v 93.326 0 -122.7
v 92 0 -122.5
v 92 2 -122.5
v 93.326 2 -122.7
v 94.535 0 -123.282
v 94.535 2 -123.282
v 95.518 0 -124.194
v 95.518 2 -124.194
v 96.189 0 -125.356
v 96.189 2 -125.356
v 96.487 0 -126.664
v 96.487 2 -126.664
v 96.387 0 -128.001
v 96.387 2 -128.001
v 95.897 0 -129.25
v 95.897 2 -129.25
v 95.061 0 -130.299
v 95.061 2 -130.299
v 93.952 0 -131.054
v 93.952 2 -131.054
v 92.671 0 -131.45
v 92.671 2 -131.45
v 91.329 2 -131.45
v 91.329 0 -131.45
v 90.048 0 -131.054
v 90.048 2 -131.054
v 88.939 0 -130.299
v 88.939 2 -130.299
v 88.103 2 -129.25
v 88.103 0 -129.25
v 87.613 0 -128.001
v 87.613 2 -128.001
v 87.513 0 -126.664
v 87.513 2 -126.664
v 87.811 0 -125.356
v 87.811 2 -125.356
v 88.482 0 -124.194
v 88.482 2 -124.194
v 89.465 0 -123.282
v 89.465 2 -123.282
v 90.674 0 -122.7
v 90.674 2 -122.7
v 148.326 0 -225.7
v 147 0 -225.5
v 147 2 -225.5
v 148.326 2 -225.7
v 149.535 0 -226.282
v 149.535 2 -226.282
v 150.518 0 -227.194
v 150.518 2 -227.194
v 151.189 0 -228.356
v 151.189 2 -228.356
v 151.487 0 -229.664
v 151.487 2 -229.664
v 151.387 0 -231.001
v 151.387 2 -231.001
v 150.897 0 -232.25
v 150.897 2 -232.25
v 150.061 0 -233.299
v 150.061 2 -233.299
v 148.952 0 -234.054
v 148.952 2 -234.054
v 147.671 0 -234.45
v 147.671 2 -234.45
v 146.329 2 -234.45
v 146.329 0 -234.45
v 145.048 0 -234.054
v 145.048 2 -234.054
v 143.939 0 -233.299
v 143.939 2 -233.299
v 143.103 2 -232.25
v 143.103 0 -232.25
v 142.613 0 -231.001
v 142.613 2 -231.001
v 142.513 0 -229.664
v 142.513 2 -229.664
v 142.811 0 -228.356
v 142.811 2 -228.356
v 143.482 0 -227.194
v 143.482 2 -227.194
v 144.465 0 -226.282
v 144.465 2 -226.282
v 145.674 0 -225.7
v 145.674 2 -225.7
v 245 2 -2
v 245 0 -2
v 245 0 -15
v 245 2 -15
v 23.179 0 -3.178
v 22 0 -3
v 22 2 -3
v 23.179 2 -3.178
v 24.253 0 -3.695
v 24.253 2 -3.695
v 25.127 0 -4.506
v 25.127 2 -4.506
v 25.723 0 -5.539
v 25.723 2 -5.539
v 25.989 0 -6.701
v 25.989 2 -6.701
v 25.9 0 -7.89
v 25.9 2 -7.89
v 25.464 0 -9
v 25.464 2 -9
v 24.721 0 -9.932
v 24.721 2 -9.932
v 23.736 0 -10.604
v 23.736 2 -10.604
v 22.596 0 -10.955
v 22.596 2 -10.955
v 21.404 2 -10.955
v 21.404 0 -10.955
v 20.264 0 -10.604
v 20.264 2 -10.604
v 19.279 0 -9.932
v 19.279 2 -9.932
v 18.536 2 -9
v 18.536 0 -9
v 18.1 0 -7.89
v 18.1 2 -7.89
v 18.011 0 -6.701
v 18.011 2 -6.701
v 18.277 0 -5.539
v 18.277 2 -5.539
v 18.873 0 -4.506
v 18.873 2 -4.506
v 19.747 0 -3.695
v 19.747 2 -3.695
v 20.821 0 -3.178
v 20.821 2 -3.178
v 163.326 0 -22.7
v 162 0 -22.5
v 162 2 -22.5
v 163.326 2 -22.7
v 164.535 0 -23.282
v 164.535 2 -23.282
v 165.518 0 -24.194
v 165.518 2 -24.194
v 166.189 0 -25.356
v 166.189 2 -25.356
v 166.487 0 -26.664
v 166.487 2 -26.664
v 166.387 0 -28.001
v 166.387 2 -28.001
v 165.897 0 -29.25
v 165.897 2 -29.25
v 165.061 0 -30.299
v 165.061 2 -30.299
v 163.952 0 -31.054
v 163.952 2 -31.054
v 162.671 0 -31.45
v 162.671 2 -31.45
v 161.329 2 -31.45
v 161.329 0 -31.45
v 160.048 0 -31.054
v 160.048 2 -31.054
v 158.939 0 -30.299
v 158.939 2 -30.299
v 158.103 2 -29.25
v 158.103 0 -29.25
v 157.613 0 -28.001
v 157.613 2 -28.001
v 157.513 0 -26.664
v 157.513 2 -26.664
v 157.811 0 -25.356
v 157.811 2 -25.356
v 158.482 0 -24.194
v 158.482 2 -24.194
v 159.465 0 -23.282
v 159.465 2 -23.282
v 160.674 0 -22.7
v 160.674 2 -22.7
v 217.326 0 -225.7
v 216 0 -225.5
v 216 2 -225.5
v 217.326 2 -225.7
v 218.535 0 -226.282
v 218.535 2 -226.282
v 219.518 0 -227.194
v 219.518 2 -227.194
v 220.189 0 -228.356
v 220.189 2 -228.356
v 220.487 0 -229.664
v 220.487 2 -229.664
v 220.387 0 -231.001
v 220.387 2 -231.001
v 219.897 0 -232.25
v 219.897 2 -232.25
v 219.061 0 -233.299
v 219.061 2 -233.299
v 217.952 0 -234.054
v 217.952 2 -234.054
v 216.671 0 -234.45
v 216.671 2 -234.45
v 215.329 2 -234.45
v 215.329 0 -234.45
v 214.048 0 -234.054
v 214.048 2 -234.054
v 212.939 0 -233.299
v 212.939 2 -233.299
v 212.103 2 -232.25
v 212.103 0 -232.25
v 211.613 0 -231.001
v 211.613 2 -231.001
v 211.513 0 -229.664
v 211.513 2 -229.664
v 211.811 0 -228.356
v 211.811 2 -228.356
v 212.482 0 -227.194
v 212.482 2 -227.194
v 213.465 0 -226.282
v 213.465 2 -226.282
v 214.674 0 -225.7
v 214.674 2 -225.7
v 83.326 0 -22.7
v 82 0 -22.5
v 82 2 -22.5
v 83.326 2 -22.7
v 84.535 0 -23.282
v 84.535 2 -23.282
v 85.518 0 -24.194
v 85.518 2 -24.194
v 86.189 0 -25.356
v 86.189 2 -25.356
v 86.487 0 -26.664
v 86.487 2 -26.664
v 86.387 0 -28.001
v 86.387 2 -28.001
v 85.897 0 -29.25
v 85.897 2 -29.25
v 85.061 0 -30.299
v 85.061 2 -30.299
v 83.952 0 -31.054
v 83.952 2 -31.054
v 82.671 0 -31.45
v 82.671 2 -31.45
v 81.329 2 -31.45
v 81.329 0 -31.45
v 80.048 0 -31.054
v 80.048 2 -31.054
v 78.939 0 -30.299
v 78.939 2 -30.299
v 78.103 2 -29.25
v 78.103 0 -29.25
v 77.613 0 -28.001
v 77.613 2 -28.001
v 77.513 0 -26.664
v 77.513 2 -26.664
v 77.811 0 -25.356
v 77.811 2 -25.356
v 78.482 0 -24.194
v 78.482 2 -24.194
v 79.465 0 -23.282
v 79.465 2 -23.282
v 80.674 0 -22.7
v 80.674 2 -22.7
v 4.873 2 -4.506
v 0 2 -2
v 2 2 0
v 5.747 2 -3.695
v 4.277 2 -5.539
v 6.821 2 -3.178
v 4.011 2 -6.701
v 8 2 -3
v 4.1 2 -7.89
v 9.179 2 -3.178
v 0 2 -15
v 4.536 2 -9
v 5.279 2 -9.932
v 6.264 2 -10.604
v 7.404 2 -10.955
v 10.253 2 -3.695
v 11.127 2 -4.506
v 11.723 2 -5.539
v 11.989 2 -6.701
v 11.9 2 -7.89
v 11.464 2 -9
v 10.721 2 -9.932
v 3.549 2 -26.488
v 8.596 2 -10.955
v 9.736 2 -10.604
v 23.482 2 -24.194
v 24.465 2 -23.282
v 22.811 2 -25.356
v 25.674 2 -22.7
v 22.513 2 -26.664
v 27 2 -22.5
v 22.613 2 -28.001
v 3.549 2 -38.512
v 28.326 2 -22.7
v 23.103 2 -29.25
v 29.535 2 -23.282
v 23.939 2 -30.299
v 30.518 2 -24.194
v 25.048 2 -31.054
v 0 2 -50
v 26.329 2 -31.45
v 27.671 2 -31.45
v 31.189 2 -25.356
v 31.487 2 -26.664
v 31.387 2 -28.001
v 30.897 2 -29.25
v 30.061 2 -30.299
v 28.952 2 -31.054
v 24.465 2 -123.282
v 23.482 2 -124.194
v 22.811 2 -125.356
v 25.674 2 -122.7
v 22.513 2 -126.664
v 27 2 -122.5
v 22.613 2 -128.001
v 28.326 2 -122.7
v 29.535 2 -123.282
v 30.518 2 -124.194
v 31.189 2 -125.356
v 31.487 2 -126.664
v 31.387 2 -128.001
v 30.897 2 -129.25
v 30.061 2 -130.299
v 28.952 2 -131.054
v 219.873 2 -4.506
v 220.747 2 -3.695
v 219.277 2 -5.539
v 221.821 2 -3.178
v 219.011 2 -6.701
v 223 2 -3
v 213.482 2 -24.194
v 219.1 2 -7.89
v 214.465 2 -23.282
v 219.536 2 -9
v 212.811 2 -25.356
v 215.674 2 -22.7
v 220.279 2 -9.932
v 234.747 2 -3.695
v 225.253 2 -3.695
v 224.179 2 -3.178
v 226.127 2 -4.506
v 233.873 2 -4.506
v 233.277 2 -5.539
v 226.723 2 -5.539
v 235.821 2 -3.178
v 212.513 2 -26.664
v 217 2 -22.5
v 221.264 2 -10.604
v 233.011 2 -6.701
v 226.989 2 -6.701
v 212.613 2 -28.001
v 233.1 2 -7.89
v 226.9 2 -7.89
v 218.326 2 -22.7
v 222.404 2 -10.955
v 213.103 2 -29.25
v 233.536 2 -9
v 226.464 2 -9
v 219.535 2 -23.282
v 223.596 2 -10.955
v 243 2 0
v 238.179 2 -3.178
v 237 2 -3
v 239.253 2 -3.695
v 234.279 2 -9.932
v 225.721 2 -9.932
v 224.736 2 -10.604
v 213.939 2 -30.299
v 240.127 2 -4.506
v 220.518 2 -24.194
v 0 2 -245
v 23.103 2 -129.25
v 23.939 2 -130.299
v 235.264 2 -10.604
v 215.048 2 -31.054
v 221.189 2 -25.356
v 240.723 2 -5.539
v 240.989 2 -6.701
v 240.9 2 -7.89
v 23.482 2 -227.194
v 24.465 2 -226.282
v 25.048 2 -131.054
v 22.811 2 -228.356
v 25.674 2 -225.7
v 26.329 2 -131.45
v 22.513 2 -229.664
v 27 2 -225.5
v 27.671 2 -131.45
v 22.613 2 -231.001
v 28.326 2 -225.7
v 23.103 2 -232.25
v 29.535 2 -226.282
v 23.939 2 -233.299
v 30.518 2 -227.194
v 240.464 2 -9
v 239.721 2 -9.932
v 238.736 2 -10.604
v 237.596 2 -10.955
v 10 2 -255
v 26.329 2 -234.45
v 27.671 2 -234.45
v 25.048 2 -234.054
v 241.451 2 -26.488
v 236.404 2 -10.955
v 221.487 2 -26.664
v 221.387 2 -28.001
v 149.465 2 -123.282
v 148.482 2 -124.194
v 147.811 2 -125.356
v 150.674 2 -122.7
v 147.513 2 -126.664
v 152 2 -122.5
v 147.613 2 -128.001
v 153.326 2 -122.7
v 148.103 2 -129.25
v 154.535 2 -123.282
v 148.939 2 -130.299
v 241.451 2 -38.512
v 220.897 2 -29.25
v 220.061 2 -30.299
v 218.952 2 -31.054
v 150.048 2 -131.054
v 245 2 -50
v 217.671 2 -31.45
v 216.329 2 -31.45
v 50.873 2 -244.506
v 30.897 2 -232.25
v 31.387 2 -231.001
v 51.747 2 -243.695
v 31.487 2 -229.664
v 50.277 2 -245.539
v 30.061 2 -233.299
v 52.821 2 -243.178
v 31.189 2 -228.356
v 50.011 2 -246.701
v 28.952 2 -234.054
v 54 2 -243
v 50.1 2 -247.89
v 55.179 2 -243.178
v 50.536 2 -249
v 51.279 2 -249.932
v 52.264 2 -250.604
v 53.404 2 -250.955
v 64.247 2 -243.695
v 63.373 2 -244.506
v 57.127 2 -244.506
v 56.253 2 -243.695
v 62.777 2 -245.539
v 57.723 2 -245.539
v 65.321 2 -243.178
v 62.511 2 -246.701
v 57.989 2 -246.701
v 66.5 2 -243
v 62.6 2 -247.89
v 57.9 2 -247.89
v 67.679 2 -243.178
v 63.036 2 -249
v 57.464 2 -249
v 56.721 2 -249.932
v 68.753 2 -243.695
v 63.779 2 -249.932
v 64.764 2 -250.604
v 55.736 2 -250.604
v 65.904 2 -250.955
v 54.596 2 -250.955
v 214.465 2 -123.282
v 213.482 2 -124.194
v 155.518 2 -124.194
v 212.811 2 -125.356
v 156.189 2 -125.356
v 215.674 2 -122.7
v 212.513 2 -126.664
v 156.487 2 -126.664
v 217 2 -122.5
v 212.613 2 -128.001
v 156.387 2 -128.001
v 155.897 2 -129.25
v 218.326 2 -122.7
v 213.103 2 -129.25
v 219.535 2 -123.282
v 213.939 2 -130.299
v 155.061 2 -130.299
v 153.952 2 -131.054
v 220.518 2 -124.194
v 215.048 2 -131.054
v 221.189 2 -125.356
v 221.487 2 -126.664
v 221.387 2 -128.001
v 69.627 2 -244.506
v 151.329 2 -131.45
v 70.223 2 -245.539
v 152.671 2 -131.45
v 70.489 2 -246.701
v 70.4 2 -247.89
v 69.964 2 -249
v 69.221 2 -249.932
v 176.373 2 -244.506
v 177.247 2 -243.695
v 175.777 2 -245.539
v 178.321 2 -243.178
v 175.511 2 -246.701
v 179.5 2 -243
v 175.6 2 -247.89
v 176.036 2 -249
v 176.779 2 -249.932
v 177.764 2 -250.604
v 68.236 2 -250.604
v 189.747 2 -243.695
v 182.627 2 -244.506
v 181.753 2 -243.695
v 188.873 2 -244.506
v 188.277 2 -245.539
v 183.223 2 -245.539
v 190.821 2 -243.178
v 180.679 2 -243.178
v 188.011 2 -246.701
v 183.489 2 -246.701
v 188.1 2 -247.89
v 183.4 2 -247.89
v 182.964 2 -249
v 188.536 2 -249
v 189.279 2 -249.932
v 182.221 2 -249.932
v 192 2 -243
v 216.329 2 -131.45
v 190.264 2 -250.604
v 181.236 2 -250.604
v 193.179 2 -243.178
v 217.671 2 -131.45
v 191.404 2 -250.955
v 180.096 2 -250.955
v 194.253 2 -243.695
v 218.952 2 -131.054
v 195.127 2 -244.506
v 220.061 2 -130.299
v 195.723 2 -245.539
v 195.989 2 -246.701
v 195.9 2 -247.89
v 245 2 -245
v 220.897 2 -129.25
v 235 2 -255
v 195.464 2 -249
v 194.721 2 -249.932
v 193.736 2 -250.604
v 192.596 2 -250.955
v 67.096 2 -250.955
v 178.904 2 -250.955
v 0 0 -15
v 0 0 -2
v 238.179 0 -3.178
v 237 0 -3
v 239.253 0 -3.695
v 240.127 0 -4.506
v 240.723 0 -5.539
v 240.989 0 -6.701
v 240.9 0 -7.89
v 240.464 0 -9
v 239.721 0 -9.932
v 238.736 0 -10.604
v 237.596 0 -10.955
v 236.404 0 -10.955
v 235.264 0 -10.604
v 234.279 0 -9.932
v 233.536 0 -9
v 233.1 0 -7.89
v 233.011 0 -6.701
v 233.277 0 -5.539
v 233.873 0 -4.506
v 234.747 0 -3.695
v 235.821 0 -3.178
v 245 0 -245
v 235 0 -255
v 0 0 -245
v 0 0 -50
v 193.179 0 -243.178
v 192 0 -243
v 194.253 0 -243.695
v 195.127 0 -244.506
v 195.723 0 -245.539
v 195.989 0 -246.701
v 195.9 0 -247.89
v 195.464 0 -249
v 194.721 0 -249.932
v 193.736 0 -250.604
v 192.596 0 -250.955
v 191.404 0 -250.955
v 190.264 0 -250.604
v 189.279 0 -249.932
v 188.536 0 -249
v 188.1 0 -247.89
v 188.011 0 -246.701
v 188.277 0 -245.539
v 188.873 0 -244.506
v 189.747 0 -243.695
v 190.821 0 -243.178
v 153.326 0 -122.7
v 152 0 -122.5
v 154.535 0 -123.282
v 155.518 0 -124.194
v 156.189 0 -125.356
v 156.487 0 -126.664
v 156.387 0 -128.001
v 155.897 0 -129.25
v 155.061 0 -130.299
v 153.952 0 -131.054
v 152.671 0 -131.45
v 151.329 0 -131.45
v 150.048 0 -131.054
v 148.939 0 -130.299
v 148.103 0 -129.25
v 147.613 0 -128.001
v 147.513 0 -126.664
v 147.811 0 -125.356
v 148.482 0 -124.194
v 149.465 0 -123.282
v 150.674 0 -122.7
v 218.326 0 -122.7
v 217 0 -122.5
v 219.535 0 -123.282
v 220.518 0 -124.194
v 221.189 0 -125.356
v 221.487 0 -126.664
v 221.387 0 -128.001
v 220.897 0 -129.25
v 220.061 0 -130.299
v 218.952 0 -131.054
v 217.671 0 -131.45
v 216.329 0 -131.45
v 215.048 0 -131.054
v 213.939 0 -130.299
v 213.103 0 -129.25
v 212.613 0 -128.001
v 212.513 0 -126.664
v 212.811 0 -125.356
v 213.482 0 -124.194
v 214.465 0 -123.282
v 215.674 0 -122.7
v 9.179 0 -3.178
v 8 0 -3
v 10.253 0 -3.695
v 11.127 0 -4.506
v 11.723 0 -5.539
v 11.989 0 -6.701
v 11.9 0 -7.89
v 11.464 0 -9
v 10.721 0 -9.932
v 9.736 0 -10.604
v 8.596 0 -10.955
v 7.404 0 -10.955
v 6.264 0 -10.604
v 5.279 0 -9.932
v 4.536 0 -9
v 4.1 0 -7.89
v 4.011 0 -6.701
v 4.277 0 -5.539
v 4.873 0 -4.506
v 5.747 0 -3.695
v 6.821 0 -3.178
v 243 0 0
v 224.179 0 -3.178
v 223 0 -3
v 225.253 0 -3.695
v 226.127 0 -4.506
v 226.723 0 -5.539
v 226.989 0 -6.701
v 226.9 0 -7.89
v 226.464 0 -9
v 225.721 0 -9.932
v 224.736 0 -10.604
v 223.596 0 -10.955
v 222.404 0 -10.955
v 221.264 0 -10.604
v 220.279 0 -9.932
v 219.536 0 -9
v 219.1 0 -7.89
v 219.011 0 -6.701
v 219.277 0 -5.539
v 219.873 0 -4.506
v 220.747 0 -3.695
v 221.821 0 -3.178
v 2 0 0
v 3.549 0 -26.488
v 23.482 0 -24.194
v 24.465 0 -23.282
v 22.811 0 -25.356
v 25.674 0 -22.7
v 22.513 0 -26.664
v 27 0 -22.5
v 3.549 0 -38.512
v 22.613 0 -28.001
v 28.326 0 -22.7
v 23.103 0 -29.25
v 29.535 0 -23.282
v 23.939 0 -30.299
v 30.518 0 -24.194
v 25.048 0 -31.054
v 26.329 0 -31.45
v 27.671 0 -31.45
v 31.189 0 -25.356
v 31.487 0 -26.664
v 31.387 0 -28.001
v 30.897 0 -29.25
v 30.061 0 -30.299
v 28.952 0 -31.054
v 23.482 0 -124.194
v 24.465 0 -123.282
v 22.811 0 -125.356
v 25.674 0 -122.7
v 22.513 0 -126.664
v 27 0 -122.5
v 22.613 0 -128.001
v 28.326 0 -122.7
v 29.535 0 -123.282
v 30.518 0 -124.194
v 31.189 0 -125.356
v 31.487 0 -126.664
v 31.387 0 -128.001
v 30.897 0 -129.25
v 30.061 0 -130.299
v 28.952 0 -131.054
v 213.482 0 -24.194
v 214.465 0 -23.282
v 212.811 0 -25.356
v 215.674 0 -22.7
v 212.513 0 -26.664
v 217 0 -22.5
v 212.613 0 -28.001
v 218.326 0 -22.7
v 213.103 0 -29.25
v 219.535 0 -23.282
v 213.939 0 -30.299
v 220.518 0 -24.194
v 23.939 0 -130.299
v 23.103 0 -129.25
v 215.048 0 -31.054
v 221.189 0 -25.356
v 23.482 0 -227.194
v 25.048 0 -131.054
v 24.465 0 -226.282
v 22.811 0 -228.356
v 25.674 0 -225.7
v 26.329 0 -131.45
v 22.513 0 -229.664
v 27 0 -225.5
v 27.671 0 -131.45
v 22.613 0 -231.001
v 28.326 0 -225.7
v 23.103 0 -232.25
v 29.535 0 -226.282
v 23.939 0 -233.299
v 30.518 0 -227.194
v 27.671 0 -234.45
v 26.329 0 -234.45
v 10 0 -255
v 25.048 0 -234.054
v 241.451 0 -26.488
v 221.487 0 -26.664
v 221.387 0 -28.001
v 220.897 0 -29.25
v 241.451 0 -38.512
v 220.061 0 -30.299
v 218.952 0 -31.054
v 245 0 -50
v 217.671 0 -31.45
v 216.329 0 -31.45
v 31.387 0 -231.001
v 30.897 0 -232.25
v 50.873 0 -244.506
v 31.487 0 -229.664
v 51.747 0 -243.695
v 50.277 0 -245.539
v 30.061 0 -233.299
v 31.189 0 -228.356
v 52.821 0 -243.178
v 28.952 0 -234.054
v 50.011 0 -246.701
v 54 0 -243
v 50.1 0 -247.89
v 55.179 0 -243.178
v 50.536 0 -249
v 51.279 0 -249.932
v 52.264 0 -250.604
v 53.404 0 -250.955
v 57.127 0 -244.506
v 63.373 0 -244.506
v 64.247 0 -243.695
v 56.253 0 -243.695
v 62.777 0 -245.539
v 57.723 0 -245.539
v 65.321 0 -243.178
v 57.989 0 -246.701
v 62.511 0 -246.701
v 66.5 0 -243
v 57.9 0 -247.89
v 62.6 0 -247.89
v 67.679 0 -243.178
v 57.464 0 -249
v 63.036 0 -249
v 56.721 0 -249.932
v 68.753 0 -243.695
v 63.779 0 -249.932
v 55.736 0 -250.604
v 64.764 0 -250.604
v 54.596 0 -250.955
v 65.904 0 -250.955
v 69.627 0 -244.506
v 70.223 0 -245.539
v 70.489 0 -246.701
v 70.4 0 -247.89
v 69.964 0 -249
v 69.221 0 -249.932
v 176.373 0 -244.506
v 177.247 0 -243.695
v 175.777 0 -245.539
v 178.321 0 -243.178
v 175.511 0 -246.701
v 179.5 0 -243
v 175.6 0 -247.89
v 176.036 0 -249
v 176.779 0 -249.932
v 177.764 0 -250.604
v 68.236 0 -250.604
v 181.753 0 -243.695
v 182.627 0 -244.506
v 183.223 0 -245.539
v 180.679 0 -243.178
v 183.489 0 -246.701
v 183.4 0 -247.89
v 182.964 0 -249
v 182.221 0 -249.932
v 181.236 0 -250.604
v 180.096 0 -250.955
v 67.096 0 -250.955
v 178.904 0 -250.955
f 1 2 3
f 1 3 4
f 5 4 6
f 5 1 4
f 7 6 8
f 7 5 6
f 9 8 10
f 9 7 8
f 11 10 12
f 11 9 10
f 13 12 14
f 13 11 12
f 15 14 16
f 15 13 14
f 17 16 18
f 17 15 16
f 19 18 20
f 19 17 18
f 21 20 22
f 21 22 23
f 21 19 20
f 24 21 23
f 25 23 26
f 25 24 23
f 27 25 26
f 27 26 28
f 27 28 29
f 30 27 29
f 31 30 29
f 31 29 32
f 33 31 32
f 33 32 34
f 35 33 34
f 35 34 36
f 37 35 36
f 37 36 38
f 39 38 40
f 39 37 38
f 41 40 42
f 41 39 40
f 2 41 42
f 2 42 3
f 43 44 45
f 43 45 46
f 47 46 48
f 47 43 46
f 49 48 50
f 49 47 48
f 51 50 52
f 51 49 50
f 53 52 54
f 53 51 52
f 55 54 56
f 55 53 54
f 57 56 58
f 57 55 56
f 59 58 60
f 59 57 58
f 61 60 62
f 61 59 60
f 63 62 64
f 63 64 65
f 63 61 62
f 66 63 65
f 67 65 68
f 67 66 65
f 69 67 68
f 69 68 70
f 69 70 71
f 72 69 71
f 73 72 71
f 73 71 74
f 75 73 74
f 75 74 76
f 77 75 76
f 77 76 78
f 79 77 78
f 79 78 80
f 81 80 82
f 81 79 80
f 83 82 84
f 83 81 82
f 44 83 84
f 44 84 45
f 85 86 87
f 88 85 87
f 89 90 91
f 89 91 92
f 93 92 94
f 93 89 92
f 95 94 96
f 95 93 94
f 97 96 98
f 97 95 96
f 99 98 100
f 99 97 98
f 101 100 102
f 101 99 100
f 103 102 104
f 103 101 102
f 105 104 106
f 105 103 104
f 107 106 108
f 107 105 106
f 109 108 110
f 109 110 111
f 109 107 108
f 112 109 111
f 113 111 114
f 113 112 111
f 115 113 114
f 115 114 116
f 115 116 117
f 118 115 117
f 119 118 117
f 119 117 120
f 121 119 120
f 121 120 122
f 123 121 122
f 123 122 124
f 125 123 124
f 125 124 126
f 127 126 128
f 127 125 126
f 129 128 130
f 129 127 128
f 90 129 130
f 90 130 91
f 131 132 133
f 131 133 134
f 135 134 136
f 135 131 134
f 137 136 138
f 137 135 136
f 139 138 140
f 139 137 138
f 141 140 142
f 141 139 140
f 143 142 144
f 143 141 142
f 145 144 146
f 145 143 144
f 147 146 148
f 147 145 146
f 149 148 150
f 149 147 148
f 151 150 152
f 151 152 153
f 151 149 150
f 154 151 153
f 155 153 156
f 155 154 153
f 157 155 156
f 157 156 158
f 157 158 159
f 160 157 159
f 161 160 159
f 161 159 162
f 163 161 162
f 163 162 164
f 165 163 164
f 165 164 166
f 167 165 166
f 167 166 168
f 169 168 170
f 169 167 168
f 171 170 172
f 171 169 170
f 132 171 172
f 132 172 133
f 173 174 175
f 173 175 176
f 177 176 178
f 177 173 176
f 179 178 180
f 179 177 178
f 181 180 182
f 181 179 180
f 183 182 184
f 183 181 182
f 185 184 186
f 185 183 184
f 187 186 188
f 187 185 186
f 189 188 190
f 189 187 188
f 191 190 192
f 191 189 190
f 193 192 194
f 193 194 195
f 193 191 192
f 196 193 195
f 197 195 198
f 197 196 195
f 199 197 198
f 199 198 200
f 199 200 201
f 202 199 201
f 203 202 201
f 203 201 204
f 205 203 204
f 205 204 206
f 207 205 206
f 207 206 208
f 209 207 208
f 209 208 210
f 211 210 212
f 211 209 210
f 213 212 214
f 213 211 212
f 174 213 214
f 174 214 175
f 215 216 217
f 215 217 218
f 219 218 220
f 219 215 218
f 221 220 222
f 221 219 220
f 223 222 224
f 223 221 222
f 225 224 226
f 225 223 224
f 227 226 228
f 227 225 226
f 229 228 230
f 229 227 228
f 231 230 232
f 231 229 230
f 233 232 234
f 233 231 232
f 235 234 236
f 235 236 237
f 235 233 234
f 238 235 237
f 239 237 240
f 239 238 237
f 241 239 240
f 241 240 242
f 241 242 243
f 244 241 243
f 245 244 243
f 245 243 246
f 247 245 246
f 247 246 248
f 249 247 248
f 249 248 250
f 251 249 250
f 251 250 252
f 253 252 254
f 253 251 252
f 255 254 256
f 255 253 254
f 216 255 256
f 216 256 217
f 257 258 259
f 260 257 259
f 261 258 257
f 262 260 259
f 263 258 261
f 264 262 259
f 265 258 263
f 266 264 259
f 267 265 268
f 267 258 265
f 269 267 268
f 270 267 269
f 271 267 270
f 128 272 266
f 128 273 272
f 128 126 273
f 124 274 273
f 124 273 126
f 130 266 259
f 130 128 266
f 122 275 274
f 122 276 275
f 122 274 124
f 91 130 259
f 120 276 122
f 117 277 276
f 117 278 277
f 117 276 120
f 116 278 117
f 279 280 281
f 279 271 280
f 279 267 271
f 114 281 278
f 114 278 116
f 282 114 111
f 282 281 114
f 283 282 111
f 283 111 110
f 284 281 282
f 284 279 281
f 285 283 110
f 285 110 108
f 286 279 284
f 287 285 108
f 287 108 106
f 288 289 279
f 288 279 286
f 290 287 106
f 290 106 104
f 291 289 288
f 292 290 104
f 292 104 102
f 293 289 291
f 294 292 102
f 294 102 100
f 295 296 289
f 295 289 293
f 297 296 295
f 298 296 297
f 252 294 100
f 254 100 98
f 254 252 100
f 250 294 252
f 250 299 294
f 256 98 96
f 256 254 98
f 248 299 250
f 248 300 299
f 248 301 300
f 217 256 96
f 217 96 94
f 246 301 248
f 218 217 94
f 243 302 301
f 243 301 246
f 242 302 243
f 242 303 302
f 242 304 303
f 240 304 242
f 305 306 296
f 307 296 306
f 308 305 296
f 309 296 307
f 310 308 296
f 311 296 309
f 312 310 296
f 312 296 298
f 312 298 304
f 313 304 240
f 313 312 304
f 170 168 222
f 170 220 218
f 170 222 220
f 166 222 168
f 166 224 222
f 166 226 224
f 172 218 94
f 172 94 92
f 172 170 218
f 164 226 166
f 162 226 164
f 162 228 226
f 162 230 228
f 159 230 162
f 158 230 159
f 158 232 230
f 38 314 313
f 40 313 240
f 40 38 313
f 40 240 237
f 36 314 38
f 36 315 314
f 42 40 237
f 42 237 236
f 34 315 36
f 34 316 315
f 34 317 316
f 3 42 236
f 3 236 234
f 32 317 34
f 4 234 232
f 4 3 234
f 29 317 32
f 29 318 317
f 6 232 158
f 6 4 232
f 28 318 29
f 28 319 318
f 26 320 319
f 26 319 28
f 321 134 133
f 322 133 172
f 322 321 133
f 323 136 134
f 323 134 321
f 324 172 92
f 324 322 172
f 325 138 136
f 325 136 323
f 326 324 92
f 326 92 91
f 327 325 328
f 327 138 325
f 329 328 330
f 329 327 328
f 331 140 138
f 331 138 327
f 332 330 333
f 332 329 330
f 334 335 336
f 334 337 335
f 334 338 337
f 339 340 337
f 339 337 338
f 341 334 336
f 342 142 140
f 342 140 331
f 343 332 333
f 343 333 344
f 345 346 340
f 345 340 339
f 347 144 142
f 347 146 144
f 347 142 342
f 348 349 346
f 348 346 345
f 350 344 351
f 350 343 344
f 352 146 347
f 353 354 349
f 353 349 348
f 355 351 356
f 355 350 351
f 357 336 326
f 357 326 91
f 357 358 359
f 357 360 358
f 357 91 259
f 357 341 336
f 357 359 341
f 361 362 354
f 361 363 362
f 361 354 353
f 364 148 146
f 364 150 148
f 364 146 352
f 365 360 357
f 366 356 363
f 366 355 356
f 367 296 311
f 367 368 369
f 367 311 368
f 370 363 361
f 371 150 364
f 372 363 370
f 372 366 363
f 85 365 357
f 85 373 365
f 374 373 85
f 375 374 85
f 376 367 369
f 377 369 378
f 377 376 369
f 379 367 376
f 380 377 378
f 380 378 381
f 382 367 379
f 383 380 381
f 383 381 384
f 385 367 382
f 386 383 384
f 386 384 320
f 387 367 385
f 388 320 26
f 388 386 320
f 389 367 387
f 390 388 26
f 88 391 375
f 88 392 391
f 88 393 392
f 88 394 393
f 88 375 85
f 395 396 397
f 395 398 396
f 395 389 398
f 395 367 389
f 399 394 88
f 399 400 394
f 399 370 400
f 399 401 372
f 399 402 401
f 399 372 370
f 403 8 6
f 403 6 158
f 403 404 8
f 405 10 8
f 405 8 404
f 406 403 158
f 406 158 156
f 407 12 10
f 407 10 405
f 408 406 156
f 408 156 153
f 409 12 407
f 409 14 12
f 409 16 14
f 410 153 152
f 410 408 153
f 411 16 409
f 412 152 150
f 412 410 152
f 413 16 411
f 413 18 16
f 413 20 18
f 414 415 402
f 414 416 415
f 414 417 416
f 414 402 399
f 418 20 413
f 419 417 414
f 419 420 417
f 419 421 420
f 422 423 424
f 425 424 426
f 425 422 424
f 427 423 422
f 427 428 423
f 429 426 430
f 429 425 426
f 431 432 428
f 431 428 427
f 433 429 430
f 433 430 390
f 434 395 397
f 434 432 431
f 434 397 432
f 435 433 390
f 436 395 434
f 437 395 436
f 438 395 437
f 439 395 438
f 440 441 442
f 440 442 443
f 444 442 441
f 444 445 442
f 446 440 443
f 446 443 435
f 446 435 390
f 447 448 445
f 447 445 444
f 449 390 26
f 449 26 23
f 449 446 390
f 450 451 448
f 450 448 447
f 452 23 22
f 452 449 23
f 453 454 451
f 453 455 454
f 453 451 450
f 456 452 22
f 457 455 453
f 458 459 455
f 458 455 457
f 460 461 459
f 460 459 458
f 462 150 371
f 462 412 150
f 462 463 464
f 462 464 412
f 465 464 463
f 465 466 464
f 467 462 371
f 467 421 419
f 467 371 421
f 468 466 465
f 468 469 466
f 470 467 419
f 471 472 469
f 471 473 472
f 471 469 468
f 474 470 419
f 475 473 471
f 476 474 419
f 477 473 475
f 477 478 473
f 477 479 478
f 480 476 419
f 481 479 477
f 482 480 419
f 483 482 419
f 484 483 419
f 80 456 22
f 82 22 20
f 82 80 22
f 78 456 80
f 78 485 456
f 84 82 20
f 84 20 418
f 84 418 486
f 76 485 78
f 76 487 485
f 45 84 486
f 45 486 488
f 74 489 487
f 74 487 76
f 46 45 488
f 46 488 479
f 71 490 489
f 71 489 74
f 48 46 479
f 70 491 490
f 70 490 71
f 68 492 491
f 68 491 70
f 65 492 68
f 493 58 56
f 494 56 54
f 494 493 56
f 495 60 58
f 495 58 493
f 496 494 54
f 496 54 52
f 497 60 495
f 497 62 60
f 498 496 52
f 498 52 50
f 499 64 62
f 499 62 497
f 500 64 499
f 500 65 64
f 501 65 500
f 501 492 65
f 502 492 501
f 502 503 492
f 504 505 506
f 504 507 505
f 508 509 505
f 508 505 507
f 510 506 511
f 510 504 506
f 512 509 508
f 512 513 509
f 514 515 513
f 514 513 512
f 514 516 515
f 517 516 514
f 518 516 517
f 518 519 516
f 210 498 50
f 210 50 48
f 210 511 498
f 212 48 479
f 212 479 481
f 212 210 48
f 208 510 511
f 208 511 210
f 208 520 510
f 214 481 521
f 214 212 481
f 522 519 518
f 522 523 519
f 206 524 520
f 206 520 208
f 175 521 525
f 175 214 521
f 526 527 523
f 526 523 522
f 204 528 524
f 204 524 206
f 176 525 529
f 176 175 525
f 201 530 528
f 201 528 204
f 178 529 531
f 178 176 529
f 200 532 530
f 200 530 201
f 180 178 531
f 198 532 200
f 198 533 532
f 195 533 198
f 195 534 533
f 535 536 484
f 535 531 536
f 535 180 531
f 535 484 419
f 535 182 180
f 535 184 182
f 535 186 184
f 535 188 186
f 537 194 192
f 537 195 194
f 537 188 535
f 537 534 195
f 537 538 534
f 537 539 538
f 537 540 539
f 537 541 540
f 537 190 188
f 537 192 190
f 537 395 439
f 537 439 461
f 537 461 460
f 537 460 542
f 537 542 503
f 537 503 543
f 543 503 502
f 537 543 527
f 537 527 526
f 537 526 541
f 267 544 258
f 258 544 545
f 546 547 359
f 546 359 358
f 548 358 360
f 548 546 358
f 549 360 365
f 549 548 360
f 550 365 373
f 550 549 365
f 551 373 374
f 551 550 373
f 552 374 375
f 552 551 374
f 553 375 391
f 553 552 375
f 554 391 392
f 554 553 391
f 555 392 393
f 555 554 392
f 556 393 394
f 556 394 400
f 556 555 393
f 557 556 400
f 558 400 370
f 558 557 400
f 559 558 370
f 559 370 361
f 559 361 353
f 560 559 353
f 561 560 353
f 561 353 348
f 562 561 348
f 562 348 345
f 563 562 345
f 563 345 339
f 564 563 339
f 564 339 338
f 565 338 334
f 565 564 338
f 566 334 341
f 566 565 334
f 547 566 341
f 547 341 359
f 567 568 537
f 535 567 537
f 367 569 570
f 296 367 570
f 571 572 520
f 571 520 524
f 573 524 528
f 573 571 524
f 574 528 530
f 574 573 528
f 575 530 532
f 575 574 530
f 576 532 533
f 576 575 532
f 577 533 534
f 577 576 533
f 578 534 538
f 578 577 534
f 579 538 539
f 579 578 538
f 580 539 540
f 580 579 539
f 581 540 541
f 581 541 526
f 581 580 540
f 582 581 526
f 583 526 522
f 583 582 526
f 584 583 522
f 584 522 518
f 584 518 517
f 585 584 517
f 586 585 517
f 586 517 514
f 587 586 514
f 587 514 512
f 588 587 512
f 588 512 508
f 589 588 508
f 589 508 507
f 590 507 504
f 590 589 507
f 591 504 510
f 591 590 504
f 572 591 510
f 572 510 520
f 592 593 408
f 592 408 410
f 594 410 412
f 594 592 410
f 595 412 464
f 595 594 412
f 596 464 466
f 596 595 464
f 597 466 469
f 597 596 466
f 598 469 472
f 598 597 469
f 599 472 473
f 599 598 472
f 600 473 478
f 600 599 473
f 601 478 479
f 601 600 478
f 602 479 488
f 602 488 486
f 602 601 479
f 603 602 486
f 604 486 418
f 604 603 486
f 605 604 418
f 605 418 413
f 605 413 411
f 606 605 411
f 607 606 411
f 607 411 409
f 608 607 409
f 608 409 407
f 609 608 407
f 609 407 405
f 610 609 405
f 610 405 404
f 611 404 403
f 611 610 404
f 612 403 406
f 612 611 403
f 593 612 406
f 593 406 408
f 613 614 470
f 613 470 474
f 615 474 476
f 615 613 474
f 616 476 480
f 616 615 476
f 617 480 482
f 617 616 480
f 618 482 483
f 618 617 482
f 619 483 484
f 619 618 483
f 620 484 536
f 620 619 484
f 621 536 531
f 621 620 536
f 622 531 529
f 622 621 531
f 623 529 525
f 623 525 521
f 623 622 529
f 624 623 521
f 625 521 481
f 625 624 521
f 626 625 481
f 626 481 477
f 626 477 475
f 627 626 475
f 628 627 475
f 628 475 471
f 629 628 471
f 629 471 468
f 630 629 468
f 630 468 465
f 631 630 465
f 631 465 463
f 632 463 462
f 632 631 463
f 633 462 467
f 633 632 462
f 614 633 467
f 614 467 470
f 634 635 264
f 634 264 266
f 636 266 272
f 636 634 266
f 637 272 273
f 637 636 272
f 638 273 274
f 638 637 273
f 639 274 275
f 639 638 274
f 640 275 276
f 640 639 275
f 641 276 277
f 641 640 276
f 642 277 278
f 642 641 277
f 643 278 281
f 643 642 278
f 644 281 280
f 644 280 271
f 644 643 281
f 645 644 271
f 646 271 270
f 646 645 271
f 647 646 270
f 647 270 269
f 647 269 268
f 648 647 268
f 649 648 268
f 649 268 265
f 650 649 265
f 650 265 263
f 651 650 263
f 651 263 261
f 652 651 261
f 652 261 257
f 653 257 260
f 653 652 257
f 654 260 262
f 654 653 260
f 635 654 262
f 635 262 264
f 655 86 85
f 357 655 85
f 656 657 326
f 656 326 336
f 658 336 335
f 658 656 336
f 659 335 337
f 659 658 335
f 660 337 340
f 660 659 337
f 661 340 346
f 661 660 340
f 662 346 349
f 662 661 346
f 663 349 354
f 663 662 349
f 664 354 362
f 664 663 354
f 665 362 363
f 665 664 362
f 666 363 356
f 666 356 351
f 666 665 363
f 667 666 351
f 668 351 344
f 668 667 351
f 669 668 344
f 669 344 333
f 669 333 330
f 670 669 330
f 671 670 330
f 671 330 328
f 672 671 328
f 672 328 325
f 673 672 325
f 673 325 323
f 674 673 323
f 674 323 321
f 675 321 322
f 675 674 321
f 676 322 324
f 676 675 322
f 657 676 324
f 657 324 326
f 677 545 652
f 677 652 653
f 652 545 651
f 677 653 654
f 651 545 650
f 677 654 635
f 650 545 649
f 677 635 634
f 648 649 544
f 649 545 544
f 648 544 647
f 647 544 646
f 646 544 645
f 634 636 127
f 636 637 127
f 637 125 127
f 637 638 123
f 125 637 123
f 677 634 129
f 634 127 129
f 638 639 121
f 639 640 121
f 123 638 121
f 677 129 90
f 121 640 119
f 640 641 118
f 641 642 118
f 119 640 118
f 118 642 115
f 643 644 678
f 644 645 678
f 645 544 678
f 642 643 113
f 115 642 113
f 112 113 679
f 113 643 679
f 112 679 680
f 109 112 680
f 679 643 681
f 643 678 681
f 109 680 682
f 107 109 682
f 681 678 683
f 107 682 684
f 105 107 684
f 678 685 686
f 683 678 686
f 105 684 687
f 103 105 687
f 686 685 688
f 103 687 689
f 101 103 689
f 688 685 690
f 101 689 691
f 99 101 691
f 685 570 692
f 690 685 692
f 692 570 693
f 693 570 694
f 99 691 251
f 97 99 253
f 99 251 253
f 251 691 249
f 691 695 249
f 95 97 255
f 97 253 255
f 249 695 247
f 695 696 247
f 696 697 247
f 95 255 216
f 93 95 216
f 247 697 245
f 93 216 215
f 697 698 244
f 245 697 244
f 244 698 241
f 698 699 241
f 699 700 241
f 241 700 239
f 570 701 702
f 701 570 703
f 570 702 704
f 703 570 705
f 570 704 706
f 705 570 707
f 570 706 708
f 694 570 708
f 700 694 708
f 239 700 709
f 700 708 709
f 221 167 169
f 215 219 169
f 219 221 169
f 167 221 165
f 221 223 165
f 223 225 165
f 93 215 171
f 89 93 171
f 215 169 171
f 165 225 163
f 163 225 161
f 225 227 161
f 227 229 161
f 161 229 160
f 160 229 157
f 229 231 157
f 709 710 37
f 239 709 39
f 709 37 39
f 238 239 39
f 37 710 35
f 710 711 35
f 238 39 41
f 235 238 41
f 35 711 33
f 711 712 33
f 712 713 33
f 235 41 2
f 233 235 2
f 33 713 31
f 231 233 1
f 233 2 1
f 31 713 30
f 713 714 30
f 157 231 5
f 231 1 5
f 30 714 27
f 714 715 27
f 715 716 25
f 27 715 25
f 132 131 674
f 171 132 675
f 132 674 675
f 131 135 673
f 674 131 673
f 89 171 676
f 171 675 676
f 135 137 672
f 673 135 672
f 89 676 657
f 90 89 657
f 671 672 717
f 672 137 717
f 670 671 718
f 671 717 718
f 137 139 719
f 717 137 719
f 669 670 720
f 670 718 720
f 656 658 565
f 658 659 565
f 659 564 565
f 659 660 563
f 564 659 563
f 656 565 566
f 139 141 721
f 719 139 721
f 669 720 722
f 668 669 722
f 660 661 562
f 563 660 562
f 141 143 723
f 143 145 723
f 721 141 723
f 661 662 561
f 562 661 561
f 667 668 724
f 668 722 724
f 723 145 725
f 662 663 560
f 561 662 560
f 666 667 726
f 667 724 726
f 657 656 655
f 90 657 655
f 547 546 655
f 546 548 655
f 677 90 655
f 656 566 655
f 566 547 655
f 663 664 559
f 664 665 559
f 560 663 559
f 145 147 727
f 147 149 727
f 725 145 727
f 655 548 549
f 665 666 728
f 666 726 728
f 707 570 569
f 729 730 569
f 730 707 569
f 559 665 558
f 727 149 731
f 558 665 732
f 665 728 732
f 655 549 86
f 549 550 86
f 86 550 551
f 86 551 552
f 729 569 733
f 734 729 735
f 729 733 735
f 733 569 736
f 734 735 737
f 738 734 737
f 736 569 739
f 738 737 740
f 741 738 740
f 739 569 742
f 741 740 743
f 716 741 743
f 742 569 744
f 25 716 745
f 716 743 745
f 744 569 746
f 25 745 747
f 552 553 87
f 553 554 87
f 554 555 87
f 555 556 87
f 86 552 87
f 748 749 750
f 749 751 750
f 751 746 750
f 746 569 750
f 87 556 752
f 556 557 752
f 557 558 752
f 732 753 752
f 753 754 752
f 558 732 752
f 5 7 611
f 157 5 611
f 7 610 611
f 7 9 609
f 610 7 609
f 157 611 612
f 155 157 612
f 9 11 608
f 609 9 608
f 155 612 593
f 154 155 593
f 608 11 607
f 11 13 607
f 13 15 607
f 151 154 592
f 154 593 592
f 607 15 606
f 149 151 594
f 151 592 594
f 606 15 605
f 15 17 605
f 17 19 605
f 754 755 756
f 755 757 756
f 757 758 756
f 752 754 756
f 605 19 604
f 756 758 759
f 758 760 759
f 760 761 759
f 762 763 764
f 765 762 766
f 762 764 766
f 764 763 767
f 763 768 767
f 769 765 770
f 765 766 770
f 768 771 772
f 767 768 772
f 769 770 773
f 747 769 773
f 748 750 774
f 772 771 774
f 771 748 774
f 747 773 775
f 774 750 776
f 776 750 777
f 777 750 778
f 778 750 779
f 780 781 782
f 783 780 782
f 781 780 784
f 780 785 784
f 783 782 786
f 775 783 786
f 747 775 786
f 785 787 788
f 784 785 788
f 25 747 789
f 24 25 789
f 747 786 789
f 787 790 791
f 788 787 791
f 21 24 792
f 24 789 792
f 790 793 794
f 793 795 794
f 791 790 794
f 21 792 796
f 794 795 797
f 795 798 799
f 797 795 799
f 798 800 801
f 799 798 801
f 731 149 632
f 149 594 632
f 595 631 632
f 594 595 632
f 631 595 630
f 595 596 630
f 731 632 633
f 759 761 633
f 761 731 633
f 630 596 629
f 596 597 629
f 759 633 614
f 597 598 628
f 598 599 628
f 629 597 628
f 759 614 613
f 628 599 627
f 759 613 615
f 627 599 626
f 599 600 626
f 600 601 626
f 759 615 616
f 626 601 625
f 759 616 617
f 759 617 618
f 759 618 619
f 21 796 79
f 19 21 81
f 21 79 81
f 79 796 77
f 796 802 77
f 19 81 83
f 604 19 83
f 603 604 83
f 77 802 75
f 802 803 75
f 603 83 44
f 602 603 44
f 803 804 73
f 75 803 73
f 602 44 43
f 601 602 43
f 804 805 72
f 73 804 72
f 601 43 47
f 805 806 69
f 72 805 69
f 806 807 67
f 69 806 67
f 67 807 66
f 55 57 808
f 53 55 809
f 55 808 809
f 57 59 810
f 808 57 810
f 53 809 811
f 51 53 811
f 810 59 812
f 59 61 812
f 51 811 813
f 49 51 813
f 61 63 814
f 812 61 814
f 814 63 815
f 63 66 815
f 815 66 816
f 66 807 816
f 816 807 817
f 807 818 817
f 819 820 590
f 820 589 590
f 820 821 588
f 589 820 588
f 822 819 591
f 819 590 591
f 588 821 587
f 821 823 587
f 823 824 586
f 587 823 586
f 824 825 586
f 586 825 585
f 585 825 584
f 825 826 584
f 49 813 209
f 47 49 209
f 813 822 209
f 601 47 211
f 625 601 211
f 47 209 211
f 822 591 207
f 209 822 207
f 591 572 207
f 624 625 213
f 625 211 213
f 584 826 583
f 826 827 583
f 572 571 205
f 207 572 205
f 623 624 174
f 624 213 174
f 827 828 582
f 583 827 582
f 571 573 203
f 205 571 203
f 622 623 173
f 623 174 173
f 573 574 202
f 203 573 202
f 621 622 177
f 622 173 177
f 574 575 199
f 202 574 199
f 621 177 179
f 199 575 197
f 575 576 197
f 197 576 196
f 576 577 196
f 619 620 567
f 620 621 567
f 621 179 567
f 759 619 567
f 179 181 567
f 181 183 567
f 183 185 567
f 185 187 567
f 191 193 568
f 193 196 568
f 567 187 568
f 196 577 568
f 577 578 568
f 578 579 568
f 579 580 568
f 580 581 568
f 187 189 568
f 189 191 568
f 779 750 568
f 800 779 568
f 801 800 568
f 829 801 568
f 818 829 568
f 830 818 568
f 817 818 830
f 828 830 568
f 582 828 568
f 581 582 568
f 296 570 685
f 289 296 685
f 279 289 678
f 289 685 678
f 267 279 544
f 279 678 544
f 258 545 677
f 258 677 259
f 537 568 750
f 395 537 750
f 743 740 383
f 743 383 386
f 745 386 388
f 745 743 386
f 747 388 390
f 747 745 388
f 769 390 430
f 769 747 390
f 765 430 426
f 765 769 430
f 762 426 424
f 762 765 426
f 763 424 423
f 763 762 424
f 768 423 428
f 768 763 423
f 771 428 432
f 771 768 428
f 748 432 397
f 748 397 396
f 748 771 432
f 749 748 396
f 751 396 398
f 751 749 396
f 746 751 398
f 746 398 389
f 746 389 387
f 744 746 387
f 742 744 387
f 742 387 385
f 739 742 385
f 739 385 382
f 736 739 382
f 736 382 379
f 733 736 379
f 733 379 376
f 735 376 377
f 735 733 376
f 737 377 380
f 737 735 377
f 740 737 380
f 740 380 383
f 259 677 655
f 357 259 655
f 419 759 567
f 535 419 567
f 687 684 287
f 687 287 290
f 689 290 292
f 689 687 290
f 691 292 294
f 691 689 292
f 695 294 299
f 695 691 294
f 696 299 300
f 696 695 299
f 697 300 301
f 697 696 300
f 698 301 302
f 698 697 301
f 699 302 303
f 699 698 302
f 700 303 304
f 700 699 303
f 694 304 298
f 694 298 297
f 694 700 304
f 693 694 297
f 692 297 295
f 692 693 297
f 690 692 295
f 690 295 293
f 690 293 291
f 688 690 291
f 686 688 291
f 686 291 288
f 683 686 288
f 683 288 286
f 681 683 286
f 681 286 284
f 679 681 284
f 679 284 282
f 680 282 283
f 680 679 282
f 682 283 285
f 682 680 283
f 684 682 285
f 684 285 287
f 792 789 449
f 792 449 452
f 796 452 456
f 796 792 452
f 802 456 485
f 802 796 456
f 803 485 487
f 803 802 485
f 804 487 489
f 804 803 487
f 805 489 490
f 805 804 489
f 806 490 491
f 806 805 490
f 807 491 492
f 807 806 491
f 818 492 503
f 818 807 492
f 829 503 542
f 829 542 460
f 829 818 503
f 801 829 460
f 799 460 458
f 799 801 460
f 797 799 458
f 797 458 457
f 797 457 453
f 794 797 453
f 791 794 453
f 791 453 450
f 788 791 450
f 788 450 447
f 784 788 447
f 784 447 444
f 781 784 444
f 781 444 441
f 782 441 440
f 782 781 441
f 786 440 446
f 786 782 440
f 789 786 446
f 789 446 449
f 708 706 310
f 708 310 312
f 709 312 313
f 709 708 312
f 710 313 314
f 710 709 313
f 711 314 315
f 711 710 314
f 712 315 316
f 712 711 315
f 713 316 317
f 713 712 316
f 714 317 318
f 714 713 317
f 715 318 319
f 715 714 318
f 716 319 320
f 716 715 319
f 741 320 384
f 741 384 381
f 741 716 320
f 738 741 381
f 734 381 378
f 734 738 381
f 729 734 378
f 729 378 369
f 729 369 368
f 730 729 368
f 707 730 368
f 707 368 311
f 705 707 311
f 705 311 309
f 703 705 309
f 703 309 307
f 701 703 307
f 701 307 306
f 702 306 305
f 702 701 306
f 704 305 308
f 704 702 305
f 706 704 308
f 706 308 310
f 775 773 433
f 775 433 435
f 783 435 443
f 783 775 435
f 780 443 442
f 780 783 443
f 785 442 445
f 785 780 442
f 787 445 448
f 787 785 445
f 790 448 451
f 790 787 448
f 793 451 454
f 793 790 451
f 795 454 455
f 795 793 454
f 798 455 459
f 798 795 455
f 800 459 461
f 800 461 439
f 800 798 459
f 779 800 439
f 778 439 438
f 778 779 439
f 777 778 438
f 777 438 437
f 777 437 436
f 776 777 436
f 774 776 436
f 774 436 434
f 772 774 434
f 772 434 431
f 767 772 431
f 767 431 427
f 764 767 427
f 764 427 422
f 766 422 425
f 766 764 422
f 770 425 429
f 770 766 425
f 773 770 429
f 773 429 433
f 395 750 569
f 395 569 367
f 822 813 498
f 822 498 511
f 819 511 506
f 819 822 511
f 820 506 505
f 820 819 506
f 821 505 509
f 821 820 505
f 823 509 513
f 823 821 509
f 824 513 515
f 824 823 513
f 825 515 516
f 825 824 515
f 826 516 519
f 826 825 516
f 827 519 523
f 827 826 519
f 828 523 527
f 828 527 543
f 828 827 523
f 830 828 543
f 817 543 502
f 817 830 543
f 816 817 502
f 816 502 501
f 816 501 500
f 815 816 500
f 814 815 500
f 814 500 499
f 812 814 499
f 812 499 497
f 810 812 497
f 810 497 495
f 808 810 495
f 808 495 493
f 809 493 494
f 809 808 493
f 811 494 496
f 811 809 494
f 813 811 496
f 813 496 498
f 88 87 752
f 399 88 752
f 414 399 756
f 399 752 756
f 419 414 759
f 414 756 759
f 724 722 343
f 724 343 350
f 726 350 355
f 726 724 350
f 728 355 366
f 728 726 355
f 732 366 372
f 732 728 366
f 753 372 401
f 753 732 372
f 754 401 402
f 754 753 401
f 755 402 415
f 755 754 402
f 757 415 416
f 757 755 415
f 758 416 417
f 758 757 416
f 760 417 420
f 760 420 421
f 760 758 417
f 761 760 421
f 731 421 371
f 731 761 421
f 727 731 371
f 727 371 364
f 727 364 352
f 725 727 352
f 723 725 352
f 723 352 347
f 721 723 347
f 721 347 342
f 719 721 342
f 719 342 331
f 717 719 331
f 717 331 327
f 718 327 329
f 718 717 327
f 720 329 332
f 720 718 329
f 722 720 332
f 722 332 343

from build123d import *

# Parameters (mm, degrees)
SKETCH1_R           = 4
SKETCH1_R_2         = 4.5
BOSS_EXTRUDE1_DEPTH = 2
CHAMFER1_SIZE       = 2
CHAMFER2_SIZE       = 10


with BuildPart() as part:
    # Sketch1 → Boss-Extrude1 (new body)
    with BuildSketch(Plane(origin=(0, 0, 0), x_dir=(1, 0, 0), z_dir=(0, 1, 0))):
        with BuildLine():
            Line((0, 0), (245, 0))
            Line((245, 0), (245, 15))
            ThreePointArc((245, 15), (241, 32.5), (245, 50))
            Line((245, 50), (245, 255))
            Line((245, 255), (0, 255))
            Line((0, 255), (0, 50))
            ThreePointArc((0, 50), (4, 32.5), (0, 15))
            Line((0, 15), (0, 0))
        make_face()
        with Locations(Location((8, 7, 0), (0, 0, 270))):
            Circle(SKETCH1_R, mode=Mode.SUBTRACT)
        with Locations(Location((22, 7, 0), (0, 0, 270))):
            Circle(SKETCH1_R, mode=Mode.SUBTRACT)
        with Locations(Location((237, 7, 0), (0, 0, 270))):
            Circle(SKETCH1_R, mode=Mode.SUBTRACT)
        with Locations(Location((223, 7, 0), (0, 0, 270))):
            Circle(SKETCH1_R, mode=Mode.SUBTRACT)
        with Locations(Location((27, 27, 0), (0, 0, 270))):
            Circle(SKETCH1_R_2, mode=Mode.SUBTRACT)
        with Locations(Location((82, 27, 0), (0, 0, 270))):
            Circle(SKETCH1_R_2, mode=Mode.SUBTRACT)
        with Locations(Location((162, 27, 0), (0, 0, 270))):
            Circle(SKETCH1_R_2, mode=Mode.SUBTRACT)
        with Locations(Location((217, 27, 0), (0, 0, 270))):
            Circle(SKETCH1_R_2, mode=Mode.SUBTRACT)
        with Locations(Location((27, 127, 0), (0, 0, 270))):
            Circle(SKETCH1_R_2, mode=Mode.SUBTRACT)
        with Locations(Location((92, 127, 0), (0, 0, 270))):
            Circle(SKETCH1_R_2, mode=Mode.SUBTRACT)
        with Locations(Location((152, 127, 0), (0, 0, 270))):
            Circle(SKETCH1_R_2, mode=Mode.SUBTRACT)
        with Locations(Location((217, 127, 0), (0, 0, 270))):
            Circle(SKETCH1_R_2, mode=Mode.SUBTRACT)
        with Locations(Location((27, 230, 0), (0, 0, 270))):
            Circle(SKETCH1_R_2, mode=Mode.SUBTRACT)
        with Locations(Location((147, 230, 0), (0, 0, 270))):
            Circle(SKETCH1_R_2, mode=Mode.SUBTRACT)
        with Locations(Location((216, 230, 0), (0, 0, 270))):
            Circle(SKETCH1_R_2, mode=Mode.SUBTRACT)
        with Locations(Location((54, 247, 0), (0, 0, 270))):
            Circle(SKETCH1_R, mode=Mode.SUBTRACT)
        with Locations(Location((66.5, 247, 0), (0, 0, 270))):
            Circle(SKETCH1_R, mode=Mode.SUBTRACT)
        with Locations(Location((179.5, 247, 0), (0, 0, 270))):
            Circle(SKETCH1_R, mode=Mode.SUBTRACT)
        with Locations(Location((192, 247, 0), (0, 0, 270))):
            Circle(SKETCH1_R, mode=Mode.SUBTRACT)
    extrude(amount=BOSS_EXTRUDE1_DEPTH)

    # Chamfer1
    chamfer1_edges = [part.edges().sort_by_distance(p)[0] for p in [
        (245, 1, 0),
        (0, 1, 0),
    ]]
    chamfer(chamfer1_edges, length=CHAMFER1_SIZE)

    # Chamfer2
    chamfer2_edges = [part.edges().sort_by_distance(p)[0] for p in [
        (0, 1, -255),
        (245, 1, -255),
    ]]
    chamfer(chamfer2_edges, length=CHAMFER2_SIZE)


solid = part.part
